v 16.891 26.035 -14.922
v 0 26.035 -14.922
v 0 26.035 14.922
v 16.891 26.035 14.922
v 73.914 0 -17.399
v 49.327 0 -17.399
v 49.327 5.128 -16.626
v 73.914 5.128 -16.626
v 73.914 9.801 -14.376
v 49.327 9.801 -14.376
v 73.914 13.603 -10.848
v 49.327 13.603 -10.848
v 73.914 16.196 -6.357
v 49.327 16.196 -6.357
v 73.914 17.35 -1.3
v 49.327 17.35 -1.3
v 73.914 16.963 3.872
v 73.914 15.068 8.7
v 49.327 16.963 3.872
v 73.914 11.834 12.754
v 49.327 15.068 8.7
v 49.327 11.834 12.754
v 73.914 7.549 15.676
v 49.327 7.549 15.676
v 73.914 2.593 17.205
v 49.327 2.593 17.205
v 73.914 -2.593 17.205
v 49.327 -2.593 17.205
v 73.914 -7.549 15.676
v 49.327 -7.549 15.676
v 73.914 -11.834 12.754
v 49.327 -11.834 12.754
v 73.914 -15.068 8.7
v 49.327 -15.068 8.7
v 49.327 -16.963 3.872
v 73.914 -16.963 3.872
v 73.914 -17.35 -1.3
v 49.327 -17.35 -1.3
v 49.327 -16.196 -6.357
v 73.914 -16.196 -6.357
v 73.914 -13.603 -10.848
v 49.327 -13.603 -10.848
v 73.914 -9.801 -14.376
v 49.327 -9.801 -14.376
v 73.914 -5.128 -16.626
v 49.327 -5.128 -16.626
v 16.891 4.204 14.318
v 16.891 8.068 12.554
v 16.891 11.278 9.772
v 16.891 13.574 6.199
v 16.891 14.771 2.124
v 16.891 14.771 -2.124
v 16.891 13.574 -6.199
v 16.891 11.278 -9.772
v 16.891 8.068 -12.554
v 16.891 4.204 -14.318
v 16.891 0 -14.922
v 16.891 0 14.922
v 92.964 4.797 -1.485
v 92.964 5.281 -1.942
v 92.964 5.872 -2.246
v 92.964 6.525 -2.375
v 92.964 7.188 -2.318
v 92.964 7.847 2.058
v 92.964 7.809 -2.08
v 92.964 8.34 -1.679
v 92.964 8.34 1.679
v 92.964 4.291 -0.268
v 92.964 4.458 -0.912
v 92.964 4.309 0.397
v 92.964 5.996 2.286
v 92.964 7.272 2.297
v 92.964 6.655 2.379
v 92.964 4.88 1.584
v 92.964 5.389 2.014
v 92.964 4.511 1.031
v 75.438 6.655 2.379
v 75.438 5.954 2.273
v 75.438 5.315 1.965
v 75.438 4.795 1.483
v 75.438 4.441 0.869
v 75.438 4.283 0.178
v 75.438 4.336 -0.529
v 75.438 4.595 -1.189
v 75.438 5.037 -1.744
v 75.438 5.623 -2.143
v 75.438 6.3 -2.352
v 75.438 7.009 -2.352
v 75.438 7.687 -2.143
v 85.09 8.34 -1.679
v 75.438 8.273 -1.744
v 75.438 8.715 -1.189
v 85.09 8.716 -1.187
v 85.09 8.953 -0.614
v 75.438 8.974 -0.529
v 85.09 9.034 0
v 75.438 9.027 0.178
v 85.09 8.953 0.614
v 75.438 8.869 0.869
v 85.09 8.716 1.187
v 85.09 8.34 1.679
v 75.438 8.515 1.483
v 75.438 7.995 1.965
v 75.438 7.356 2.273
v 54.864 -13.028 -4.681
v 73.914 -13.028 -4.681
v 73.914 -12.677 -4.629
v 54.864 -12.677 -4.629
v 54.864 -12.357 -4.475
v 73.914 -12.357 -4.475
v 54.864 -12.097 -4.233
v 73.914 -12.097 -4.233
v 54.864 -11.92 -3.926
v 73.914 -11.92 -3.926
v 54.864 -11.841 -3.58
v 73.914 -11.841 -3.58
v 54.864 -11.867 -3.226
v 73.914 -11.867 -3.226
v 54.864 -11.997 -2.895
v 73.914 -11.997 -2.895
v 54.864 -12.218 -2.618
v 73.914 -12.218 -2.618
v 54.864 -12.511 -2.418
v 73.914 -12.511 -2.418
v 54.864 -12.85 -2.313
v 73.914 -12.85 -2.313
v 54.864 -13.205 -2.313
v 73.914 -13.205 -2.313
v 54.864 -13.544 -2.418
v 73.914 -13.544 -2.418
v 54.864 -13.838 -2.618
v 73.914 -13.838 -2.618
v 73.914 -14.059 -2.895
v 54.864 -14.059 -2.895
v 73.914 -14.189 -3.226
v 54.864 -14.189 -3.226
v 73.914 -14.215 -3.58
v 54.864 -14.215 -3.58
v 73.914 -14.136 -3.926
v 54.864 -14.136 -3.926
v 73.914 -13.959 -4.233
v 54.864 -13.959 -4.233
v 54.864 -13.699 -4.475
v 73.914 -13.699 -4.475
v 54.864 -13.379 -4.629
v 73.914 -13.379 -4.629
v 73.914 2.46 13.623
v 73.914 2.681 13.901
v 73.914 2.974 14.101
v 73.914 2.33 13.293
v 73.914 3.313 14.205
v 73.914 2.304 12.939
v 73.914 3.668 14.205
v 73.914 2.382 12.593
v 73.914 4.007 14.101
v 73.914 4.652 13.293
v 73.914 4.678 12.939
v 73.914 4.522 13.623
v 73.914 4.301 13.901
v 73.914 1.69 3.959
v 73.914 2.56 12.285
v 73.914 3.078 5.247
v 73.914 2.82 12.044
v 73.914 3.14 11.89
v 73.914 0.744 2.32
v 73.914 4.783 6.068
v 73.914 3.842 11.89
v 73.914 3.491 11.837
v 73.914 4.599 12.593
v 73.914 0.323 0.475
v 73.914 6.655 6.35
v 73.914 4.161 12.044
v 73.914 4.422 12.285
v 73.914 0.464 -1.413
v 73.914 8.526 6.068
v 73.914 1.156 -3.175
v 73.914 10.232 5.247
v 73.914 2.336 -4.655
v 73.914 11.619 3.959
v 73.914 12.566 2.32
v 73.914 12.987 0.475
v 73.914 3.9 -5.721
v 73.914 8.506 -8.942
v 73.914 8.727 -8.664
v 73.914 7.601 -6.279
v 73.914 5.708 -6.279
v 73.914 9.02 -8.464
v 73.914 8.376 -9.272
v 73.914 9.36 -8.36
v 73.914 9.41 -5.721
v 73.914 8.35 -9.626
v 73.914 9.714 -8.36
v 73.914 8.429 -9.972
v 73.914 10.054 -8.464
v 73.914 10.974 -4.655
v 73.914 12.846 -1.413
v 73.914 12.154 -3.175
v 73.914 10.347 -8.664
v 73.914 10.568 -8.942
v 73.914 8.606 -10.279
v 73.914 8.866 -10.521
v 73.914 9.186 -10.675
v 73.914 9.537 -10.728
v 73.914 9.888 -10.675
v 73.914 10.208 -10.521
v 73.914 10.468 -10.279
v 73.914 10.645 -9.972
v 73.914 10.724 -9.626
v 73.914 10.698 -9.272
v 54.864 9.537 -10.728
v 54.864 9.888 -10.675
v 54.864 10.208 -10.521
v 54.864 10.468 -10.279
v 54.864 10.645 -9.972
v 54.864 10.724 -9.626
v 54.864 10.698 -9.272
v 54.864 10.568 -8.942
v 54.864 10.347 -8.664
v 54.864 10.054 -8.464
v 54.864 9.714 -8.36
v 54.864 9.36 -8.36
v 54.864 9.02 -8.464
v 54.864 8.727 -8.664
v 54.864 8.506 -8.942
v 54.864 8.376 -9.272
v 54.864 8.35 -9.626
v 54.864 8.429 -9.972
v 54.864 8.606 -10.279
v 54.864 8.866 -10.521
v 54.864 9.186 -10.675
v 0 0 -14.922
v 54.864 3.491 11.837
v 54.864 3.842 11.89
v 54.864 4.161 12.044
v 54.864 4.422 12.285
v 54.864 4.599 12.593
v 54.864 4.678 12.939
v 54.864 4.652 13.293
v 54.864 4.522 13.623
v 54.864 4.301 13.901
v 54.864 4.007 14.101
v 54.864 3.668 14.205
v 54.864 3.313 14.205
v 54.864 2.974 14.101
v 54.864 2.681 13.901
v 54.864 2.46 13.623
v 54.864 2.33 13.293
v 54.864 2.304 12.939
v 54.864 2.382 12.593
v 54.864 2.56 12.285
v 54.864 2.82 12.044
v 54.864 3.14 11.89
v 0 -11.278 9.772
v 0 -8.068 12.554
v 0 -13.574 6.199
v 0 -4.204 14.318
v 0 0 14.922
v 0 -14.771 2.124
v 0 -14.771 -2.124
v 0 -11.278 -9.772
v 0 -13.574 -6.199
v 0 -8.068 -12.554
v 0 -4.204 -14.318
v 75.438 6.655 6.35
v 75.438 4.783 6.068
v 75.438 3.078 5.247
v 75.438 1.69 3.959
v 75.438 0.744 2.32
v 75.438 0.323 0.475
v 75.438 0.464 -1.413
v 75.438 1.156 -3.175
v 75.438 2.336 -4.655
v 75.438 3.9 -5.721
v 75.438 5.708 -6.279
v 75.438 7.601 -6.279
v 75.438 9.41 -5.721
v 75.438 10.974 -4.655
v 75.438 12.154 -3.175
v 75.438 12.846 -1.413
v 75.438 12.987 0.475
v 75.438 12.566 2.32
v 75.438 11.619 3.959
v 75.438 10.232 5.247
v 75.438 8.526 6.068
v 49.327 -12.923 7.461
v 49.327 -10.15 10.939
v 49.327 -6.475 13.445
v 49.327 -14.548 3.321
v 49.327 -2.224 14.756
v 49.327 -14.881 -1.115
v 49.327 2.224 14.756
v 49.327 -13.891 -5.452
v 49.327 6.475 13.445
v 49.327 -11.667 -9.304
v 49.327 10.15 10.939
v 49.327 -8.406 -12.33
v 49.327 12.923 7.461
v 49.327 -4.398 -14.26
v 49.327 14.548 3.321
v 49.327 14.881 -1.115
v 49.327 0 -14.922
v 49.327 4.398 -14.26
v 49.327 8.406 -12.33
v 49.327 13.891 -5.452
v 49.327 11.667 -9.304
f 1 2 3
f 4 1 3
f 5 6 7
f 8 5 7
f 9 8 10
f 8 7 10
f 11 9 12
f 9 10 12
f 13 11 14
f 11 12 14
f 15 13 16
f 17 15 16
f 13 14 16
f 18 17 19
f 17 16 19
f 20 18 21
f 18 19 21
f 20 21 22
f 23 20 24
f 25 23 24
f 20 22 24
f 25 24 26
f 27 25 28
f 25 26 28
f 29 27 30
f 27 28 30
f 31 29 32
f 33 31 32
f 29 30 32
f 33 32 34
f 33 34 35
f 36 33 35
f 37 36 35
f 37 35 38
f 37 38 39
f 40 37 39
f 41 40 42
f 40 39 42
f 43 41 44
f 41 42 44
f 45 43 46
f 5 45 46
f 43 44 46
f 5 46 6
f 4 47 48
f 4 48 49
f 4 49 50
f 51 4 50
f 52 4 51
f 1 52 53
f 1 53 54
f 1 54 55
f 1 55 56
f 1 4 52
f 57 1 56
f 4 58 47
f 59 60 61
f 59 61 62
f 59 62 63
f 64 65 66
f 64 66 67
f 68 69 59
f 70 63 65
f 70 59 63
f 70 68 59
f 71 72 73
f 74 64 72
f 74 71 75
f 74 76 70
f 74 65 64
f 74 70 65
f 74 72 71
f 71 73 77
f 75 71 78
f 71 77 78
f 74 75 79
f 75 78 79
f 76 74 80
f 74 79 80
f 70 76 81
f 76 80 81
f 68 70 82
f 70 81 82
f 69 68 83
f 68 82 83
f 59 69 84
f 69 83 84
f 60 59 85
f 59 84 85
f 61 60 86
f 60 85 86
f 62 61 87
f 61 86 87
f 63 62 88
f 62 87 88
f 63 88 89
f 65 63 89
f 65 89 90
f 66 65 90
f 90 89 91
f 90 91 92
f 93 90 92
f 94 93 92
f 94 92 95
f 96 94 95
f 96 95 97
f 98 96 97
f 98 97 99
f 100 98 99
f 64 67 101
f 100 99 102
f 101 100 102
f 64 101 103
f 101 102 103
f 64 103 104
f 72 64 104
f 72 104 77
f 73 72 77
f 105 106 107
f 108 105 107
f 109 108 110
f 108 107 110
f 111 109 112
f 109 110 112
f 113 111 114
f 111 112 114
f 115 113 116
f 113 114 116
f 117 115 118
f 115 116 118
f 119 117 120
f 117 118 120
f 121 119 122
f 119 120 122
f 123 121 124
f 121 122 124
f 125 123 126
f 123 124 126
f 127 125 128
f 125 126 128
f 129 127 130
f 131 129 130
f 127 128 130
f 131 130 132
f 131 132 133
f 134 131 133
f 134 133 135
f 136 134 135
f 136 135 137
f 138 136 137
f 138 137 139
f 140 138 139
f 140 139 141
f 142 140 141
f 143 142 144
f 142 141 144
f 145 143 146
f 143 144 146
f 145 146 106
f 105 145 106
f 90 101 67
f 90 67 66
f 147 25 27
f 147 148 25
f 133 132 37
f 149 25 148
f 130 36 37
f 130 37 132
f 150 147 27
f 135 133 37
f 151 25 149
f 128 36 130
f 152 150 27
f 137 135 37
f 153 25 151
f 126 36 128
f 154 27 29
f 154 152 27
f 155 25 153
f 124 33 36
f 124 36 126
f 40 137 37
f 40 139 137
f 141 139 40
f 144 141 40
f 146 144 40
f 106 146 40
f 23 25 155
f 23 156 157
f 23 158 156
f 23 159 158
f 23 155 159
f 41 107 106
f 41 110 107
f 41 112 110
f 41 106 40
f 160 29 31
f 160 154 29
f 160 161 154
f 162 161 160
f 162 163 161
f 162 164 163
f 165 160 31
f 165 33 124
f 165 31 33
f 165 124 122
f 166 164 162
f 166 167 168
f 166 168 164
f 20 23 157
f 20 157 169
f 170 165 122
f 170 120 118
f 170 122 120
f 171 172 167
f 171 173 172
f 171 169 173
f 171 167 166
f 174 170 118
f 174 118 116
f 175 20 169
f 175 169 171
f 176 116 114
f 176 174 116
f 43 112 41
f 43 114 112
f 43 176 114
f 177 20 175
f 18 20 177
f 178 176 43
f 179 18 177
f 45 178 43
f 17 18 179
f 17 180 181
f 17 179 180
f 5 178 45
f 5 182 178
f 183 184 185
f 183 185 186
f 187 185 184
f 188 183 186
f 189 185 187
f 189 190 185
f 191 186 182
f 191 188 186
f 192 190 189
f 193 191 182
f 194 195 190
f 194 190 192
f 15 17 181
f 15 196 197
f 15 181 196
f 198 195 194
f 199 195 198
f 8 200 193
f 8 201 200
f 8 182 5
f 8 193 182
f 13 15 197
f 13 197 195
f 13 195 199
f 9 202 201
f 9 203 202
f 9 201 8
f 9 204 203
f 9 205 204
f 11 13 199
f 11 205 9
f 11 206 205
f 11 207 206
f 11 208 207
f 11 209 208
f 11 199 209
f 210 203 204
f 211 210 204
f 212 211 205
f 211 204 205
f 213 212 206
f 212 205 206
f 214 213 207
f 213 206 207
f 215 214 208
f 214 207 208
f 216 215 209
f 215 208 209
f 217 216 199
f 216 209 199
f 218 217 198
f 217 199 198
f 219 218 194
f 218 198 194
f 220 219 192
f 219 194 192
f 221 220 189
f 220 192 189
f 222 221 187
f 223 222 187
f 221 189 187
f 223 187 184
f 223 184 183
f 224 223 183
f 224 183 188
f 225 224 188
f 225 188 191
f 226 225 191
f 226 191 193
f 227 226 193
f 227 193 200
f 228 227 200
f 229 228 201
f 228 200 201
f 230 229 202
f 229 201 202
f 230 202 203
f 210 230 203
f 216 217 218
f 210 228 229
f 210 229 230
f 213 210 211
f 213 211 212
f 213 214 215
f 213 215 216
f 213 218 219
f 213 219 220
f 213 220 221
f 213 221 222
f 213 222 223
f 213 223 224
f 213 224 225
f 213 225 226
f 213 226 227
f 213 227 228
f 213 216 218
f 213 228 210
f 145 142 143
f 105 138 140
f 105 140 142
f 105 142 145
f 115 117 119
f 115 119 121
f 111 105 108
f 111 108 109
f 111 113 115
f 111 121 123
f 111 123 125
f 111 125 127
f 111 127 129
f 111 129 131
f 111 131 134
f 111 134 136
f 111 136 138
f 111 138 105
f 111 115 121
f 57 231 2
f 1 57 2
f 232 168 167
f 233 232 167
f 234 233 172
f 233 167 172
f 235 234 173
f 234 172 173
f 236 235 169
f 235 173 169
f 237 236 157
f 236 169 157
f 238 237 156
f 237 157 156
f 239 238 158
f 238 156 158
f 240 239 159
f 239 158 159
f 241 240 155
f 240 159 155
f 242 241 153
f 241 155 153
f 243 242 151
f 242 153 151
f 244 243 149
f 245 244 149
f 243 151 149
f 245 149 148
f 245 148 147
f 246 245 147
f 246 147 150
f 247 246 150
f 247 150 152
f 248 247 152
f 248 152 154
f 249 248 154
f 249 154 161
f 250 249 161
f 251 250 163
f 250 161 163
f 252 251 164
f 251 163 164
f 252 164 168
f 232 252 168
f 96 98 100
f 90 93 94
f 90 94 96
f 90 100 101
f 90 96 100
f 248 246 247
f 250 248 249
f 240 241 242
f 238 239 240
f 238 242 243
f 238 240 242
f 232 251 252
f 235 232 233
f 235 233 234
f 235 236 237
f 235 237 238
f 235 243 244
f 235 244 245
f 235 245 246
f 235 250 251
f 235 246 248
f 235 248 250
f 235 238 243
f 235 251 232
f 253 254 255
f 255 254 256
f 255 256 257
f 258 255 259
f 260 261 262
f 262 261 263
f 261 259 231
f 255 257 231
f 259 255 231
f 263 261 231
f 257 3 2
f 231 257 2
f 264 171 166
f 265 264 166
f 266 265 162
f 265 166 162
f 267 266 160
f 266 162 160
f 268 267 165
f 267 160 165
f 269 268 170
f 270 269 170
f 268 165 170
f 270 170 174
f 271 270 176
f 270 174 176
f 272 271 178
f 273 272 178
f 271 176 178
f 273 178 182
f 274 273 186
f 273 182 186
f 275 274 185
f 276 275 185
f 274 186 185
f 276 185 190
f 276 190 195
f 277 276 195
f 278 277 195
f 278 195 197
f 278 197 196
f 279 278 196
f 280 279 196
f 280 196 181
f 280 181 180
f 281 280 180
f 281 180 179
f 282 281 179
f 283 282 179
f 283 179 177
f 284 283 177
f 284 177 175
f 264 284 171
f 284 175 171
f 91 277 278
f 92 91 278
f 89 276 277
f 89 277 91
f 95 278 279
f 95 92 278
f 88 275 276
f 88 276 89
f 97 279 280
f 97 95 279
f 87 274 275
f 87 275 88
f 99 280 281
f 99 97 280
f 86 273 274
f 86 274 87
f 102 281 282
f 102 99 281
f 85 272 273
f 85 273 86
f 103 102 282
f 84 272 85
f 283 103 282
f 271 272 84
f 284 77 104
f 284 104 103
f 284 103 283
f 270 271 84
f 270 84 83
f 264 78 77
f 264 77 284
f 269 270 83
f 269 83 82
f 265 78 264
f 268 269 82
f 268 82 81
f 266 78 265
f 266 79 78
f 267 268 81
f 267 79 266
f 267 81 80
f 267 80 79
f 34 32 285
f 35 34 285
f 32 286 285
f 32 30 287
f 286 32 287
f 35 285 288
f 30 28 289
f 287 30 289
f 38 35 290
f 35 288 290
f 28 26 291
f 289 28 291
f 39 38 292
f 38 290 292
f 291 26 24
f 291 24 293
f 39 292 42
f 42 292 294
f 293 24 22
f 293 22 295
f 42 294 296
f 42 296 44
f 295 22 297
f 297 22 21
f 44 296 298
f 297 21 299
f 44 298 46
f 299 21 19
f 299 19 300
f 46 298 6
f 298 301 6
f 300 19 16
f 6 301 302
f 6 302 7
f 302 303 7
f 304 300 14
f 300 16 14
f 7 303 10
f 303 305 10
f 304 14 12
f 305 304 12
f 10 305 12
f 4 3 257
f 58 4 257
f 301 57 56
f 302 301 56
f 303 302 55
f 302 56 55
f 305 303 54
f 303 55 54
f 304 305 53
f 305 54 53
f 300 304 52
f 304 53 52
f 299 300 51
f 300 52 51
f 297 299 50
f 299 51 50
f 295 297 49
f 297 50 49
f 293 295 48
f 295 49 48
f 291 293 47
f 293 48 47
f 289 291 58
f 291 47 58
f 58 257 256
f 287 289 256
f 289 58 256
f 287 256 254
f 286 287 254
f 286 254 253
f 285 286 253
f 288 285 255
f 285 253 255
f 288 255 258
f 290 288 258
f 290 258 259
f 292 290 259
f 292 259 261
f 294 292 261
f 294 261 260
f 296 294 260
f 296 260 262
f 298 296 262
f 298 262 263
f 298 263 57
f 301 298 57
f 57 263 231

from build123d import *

# Parameters (mm, degrees)
SKETCH1_R           = 14.9225
BOSS_EXTRUDE1_DEPTH = 49.3268
BOSS_EXTRUDE2_DEPTH = 16.891
SKETCH3_R           = 17.399
BOSS_EXTRUDE3_DEPTH = 24.5872
SKETCH4_R           = 2.37871
BOSS_EXTRUDE4_DEPTH = 19.05
SKETCH5_R           = 6.35
BOSS_EXTRUDE5_DEPTH = 1.524
SKETCH6_R           = 1.190625
CUT_EXTRUDE1_DEPTH  = 19.05
CUT_EXTRUDE2_START  = -7.874
CUT_EXTRUDE2_DEPTH  = 7.874


with BuildPart() as part:
    # Sketch1 → Boss-Extrude1 (new body)
    with BuildSketch(Plane(origin=(0, 0, 0), x_dir=(0, 0, -1), z_dir=(1, 0, 0))):
        Circle(SKETCH1_R)
    extrude(amount=BOSS_EXTRUDE1_DEPTH)

    # Sketch2 → Boss-Extrude2 (add)
    with BuildSketch(Plane.ZY):
        with BuildLine():
            Line((-14.9225, 26.035), (14.9225, 26.035))
            Line((14.9225, 26.035), (14.9225, 0))
            ThreePointArc((14.9225, 0), (0, -14.9225), (-14.9225, 0))
            Line((-14.9225, 0), (-14.9225, 26.035))
        make_face()
    extrude(amount=-BOSS_EXTRUDE2_DEPTH)

    # Sketch3 → Boss-Extrude3 (add)
    with BuildSketch(Plane(origin=(49.3268, 0, 0), x_dir=(0, 0, -1), z_dir=(1, 0, 0))):
        Circle(SKETCH3_R)
    extrude(amount=BOSS_EXTRUDE3_DEPTH)

    # Sketch4 → Boss-Extrude4 (add)
    with BuildSketch(Plane(origin=(73.914, 0, 0), x_dir=(0, 0, -1), z_dir=(1, 0, 0))):
        with Locations(Location((0, 6.6548, 0), (0, 0, 180))):
            Circle(SKETCH4_R)
    extrude(amount=BOSS_EXTRUDE4_DEPTH)

    # Sketch5 → Boss-Extrude5 (add)
    with BuildSketch(Plane(origin=(73.914, 0, 0), x_dir=(0, 0, -1), z_dir=(1, 0, 0))):
        with Locations(Location((0, 6.6548, 0), (0, 0, 180))):
            Circle(SKETCH5_R)
    extrude(amount=BOSS_EXTRUDE5_DEPTH)

    # Sketch6 → Cut-Extrude1 (cut)
    with BuildSketch(Plane(origin=(73.914, 0, 0), x_dir=(0, 0, -1), z_dir=(1, 0, 0))):
        with Locations((3.490795989, -13.027827989)):
            Circle(SKETCH6_R)
        with Locations((-13.027827989, 3.490795989)):
            Circle(SKETCH6_R)
        with Locations((9.537032001, 9.537032001)):
            Circle(SKETCH6_R)
    extrude(amount=-CUT_EXTRUDE1_DEPTH, mode=Mode.SUBTRACT)

    # Sketch7 → Cut-Extrude2 (cut)
    with BuildSketch(Plane(origin=(92.964, 0, 0), x_dir=(0, 0, -1), z_dir=(1, 0, 0)).offset(CUT_EXTRUDE2_START)):
        with BuildLine():
            Line((-1.678707503, 8.34009), (1.678707503, 8.34009))
            ThreePointArc((1.678707503, 8.34009), (0, 9.03351), (-1.678707503, 8.34009))
        make_face()
    extrude(amount=CUT_EXTRUDE2_DEPTH, mode=Mode.SUBTRACT)


solid = part.part
